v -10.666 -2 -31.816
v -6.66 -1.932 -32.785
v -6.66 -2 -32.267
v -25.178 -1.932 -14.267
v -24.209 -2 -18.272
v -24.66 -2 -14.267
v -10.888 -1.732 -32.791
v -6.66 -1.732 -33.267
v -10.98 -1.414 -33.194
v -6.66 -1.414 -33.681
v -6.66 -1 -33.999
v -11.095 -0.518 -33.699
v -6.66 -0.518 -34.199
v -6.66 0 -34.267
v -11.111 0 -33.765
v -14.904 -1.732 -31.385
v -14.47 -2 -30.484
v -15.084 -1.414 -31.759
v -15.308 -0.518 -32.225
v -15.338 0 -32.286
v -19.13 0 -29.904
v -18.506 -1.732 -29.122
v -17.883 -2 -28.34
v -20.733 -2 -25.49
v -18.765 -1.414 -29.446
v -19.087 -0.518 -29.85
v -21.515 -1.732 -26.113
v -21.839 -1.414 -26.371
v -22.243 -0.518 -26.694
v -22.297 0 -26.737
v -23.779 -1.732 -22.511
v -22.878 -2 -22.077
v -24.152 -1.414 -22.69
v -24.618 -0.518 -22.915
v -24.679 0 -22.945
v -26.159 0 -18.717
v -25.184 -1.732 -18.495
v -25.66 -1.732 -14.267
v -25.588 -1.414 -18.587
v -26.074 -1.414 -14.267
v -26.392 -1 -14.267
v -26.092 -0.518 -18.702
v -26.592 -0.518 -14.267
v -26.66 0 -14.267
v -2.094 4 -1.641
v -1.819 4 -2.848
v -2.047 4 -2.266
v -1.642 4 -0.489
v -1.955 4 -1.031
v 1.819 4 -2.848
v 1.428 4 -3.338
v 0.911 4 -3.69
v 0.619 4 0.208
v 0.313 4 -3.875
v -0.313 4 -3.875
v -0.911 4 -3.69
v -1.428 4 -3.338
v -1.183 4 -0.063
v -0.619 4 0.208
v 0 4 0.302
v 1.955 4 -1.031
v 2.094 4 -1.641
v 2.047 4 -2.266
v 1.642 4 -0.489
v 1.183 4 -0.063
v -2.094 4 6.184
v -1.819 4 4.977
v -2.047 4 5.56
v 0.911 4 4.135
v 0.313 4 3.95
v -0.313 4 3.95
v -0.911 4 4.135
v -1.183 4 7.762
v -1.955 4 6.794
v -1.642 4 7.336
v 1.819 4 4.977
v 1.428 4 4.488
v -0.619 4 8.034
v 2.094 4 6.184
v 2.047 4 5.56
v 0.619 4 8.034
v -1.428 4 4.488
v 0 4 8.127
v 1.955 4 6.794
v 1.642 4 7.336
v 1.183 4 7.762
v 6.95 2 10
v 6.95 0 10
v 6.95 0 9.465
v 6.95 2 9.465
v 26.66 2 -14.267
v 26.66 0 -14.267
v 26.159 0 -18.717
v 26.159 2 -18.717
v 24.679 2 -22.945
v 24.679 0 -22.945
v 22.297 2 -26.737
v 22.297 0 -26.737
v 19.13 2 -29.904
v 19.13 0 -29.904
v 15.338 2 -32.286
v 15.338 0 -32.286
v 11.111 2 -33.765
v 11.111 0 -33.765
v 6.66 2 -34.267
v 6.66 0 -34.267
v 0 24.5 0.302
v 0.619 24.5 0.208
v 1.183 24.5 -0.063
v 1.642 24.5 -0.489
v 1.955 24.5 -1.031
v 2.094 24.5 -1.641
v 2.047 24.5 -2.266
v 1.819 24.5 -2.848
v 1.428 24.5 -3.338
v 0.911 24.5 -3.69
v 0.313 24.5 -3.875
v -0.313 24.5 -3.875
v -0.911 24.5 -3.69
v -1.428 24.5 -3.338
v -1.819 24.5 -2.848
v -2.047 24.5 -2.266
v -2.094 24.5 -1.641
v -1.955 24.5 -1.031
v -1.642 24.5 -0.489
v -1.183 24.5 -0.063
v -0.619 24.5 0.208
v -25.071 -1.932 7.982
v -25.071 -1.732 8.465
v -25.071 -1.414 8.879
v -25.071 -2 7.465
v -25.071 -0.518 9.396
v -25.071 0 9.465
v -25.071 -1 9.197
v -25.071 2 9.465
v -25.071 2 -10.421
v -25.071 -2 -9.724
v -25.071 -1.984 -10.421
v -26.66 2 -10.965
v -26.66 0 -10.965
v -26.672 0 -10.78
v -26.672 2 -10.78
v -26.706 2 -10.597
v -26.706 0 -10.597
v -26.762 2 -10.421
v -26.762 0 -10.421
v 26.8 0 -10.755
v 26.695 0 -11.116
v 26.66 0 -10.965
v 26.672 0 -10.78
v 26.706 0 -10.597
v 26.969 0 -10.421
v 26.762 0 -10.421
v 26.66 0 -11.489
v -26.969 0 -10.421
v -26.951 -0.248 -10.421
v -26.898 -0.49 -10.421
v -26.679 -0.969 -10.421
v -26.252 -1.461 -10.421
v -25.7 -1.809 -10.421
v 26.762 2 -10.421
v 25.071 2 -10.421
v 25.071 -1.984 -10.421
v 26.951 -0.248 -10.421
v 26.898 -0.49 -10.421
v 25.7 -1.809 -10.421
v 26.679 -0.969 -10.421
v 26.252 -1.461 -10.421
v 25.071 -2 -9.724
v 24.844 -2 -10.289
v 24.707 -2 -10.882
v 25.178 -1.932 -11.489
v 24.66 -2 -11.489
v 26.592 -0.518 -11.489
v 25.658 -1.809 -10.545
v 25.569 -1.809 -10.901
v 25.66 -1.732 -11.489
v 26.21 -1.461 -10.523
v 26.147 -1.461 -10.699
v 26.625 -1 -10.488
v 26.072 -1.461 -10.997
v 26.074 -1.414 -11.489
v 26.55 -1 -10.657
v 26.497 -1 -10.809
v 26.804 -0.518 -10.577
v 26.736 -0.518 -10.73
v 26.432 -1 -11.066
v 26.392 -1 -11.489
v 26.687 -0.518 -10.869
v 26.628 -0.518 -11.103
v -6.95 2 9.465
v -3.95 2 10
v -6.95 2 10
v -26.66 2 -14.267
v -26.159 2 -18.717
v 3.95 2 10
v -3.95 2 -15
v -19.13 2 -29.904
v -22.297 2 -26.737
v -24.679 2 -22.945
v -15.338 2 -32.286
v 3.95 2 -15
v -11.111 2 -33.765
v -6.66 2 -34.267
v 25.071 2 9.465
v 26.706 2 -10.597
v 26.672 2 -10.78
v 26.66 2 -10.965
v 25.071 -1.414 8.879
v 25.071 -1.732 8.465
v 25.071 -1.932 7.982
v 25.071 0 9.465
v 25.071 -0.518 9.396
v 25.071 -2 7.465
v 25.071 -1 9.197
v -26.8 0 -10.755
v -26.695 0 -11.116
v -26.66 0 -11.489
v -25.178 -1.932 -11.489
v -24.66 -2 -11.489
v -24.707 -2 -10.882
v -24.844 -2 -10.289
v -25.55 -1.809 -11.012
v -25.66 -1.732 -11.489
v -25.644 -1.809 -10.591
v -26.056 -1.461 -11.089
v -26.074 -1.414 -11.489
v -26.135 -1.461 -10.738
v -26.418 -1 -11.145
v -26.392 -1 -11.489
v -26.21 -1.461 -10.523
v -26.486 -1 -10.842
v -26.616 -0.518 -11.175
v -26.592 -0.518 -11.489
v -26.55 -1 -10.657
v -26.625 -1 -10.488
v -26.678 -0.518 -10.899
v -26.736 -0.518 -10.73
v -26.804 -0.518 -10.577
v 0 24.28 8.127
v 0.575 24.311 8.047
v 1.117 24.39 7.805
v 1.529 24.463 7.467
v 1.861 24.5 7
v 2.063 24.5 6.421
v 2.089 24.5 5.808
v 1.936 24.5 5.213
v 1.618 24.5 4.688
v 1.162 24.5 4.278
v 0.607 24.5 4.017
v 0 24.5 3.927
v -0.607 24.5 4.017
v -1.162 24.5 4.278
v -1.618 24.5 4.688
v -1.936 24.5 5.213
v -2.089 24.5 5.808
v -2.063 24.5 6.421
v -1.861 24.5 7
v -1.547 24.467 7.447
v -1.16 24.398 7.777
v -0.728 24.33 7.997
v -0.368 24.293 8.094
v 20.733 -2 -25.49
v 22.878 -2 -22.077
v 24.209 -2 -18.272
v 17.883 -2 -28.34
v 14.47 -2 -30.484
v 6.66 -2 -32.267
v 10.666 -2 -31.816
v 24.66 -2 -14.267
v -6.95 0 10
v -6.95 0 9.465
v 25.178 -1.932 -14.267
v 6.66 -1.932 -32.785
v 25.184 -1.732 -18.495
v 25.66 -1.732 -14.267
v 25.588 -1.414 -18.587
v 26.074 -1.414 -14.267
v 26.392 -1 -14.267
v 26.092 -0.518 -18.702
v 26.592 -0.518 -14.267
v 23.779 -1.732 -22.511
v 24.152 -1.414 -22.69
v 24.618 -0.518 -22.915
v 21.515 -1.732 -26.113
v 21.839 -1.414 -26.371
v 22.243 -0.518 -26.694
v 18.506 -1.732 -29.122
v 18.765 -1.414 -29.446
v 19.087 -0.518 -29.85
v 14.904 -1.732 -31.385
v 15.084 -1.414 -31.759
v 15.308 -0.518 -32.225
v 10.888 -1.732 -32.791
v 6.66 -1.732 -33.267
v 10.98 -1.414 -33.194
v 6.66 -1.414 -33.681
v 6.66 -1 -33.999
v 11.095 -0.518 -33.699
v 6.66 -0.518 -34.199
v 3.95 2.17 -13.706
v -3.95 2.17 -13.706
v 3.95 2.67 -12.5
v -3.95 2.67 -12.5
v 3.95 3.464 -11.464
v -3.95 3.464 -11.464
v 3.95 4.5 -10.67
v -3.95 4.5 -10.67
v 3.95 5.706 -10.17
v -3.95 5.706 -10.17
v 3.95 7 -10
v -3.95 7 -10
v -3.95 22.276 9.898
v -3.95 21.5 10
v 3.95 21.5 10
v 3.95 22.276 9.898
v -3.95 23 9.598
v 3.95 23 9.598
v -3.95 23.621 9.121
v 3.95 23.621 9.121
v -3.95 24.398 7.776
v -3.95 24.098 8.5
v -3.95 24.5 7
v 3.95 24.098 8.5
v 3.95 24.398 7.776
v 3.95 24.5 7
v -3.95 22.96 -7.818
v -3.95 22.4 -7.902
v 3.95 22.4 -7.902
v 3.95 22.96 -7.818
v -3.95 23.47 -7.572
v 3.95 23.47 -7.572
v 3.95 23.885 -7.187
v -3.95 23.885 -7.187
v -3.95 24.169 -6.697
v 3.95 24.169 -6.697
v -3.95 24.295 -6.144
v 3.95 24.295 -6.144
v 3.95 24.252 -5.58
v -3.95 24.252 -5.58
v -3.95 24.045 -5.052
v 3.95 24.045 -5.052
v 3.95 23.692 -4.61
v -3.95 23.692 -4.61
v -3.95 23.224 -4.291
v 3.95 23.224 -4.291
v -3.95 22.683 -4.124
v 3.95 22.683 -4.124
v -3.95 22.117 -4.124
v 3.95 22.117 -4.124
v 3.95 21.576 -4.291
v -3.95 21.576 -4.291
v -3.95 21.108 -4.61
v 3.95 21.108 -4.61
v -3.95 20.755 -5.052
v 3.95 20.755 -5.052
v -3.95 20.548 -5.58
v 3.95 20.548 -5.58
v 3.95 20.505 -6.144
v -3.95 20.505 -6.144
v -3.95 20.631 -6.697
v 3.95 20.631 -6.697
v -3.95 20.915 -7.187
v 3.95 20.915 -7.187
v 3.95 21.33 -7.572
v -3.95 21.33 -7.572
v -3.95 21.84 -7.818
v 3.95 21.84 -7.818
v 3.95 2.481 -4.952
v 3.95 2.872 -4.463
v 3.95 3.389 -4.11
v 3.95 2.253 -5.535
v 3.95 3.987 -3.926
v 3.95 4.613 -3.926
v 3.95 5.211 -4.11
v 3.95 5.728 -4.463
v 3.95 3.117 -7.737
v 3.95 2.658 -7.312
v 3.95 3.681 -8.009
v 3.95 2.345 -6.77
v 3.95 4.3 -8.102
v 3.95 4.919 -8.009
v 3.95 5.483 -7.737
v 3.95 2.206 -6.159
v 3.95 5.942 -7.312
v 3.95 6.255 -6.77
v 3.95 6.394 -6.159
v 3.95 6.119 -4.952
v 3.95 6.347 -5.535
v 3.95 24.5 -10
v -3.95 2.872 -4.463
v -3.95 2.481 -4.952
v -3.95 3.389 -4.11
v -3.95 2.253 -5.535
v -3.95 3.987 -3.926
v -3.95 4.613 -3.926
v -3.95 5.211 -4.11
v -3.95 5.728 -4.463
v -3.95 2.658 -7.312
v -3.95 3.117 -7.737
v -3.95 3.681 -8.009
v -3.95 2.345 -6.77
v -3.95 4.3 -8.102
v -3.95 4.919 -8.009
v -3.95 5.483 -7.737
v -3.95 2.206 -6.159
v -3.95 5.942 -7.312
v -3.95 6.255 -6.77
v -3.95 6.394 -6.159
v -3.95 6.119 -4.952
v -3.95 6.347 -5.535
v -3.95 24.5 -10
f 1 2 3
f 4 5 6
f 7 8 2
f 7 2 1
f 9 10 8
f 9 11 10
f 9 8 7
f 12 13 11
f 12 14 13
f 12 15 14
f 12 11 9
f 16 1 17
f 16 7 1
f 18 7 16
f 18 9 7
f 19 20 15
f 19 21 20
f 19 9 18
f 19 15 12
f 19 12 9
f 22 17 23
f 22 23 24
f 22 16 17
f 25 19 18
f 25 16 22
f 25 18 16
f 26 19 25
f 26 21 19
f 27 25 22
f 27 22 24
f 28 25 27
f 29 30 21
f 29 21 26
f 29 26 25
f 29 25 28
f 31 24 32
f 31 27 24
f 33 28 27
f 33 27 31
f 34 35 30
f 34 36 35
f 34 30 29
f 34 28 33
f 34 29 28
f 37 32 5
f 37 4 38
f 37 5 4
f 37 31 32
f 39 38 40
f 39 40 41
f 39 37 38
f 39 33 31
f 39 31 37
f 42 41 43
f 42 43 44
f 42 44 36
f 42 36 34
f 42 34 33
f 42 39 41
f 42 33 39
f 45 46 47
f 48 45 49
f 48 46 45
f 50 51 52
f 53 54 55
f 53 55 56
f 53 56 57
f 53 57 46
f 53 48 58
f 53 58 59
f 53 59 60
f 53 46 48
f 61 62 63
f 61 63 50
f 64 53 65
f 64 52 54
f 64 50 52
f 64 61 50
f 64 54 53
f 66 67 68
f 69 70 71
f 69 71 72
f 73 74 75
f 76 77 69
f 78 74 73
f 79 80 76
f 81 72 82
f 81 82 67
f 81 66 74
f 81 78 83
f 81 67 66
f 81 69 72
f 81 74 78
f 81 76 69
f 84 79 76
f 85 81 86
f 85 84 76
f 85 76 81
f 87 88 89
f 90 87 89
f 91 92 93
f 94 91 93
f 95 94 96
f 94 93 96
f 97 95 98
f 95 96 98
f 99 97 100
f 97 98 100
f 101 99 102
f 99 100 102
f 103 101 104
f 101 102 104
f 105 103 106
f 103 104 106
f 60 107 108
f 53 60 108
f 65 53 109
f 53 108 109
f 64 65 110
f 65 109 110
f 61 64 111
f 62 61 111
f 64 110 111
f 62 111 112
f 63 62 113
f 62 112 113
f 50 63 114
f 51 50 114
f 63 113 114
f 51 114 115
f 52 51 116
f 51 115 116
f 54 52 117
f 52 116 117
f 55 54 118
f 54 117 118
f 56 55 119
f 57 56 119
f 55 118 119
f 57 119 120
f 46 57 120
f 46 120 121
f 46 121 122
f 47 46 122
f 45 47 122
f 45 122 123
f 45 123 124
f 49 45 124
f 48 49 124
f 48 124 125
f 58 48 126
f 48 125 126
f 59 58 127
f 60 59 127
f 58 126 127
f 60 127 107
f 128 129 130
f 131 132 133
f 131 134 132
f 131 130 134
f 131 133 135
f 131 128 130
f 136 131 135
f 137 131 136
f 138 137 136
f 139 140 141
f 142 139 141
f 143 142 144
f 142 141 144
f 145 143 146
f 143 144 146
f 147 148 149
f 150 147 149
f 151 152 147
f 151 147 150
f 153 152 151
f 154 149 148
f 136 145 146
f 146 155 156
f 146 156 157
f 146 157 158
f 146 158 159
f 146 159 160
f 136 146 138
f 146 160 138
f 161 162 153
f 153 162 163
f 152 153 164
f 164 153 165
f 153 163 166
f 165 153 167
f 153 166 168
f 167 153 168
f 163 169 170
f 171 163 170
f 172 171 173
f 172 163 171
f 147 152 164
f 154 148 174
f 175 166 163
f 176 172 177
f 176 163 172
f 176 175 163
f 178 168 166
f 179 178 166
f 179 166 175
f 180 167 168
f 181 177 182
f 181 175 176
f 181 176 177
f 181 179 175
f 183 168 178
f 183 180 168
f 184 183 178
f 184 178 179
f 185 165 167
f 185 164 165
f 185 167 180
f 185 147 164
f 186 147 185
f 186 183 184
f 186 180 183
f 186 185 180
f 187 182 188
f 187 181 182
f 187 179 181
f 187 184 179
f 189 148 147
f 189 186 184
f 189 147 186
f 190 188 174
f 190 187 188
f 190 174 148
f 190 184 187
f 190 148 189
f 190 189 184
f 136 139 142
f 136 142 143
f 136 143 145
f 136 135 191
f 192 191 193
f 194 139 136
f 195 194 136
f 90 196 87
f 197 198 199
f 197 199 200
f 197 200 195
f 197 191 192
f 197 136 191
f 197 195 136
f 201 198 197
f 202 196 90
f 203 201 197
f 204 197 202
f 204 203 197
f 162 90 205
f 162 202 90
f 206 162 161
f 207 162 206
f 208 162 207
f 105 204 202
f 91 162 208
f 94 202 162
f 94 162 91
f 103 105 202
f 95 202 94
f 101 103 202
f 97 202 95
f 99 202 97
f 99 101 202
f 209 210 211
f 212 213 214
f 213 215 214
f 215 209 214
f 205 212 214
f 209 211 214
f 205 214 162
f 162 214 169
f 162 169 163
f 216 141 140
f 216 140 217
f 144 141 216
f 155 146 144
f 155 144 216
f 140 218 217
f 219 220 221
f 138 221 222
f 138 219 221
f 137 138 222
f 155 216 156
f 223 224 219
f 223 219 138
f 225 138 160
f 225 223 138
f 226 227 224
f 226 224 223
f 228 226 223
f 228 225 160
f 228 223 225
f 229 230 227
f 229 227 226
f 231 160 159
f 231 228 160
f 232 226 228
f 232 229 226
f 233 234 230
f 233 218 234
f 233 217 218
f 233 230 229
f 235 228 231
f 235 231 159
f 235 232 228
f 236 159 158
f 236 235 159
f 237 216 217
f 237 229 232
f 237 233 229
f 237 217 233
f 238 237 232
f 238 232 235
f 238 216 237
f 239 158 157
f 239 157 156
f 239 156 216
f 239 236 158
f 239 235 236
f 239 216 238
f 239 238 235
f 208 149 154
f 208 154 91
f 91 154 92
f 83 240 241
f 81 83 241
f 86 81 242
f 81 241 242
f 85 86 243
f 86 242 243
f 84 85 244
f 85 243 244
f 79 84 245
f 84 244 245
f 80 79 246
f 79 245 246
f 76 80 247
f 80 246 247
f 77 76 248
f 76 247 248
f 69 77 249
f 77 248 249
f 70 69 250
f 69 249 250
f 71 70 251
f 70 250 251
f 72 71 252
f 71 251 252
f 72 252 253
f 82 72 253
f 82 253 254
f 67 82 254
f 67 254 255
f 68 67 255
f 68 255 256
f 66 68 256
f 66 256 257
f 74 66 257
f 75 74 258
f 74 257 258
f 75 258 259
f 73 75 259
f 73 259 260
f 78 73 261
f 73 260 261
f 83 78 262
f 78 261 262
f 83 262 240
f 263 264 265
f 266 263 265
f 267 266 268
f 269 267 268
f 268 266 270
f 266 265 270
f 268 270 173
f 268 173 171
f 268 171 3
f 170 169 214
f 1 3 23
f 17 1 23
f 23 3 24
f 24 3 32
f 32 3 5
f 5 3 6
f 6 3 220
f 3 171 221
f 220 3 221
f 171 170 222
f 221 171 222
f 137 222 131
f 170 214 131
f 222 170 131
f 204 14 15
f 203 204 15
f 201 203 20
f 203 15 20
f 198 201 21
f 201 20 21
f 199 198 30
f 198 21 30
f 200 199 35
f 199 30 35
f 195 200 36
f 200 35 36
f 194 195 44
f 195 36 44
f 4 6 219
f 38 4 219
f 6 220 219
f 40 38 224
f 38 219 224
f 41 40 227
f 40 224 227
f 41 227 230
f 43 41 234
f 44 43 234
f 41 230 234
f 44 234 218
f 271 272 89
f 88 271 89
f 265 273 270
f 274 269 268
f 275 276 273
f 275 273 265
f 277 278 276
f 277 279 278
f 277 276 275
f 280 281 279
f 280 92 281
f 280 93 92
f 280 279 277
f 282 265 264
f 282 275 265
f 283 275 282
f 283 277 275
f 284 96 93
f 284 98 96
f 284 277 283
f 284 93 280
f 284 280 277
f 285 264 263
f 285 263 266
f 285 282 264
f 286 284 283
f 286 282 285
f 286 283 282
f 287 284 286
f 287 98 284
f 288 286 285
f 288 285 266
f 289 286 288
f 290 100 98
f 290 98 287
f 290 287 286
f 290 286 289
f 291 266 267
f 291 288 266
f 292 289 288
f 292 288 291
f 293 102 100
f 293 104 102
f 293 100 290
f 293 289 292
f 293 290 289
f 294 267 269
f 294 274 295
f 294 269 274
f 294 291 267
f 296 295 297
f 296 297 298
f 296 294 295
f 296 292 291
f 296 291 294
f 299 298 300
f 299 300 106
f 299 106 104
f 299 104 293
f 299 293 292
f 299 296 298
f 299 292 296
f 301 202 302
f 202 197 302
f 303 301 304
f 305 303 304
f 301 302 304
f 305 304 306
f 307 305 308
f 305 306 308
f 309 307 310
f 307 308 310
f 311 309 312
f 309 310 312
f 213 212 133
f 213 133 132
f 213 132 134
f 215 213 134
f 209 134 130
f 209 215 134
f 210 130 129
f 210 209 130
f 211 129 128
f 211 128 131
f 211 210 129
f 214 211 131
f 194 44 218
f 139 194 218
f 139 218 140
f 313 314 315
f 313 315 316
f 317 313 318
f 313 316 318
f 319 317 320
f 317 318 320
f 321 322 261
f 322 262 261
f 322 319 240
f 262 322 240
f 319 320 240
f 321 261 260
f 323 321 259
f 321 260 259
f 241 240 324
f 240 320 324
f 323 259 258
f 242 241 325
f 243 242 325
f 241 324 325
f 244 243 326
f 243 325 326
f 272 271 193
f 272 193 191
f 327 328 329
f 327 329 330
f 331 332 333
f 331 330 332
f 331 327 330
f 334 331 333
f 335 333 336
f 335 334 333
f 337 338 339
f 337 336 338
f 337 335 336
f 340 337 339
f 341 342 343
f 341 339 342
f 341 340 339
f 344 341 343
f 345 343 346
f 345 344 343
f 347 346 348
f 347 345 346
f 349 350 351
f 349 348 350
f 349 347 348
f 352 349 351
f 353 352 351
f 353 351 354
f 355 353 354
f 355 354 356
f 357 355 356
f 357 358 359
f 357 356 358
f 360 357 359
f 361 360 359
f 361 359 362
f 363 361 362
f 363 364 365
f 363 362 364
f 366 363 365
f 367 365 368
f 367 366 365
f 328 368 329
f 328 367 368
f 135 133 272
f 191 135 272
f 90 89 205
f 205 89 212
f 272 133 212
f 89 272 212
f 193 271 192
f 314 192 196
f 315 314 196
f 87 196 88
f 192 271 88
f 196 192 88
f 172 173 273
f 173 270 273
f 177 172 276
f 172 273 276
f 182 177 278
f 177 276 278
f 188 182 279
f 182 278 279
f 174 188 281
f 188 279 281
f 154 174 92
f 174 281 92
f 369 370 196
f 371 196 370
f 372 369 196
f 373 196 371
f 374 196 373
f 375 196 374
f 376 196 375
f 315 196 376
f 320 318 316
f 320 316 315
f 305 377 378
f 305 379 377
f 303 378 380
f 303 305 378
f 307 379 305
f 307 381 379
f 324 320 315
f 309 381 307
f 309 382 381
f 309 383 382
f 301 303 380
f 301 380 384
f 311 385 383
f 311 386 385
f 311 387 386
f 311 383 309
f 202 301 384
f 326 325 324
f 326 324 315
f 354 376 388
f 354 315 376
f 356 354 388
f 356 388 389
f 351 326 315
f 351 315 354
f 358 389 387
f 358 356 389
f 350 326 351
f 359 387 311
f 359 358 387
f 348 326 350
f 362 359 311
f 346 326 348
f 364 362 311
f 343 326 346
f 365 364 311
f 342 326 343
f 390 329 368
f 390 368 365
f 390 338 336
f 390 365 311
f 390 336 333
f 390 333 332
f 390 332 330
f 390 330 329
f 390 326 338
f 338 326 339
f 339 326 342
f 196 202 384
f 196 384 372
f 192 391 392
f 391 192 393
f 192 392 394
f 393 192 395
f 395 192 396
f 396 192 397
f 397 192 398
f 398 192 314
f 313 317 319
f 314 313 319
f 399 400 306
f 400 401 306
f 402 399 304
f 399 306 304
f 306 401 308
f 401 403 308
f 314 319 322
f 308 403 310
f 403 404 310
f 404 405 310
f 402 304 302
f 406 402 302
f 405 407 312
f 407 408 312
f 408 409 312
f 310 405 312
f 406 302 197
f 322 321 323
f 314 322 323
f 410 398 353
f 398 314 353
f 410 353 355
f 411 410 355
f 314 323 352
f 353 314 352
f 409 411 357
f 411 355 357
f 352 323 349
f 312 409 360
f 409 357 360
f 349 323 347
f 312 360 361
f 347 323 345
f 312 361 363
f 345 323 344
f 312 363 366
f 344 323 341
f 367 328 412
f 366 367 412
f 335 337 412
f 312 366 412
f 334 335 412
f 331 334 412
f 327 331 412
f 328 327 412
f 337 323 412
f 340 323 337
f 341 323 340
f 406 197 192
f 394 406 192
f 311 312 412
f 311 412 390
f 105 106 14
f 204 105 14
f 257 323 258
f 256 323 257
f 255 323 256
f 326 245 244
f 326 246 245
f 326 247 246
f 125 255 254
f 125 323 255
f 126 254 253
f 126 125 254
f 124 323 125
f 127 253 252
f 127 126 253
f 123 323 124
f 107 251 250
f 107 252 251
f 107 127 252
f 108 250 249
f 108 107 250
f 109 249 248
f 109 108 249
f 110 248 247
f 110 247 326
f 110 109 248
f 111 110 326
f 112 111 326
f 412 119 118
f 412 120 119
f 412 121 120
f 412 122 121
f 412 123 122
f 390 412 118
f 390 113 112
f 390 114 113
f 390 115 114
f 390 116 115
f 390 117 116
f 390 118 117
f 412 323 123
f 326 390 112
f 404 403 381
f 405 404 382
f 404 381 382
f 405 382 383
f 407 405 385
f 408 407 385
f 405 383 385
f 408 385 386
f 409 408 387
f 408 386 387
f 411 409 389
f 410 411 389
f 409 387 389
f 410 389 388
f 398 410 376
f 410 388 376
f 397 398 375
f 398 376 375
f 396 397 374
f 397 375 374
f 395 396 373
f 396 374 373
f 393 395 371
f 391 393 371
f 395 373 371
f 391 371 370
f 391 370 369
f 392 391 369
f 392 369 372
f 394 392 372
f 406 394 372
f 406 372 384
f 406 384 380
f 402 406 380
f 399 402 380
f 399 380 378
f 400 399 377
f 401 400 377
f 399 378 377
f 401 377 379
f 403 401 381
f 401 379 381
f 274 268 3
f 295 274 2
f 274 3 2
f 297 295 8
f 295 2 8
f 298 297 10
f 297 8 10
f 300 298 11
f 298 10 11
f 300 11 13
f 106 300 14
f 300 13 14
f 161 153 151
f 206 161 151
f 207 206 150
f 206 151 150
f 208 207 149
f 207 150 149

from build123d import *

# Parameters (mm, degrees)
SALIENTE_EXTRUIR1_DEPTH     = 2
CROQUIS2_W                  = 13.9
CROQUIS2_H                  = 20
SALIENTE_EXTRUIR2_DEPTH     = 24.5
SALIENTE_EXTRUIR3_DEPTH     = 22.5
CROQUIS5_R                  = 2.1
CORTAR_EXTRUIR2_DEPTH       = 20.5
CROQUIS16_W                 = 3
CROQUIS16_H                 = 33.930468167
CORTAR_EXTRUIR8_DEPTH       = 22.5
CORTAR_EXTRUIR1_DEPTH       = 27
CORTAR_EXTRUIR1_DEPTH_BACK  = 65.5
CROQUIS4_R                  = 1.599999999
REDONDEO1_R                 = 3
REDONDEO2_R                 = 5
SALIENTE_EXTRUIR5_START     = 2
SALIENTE_EXTRUIR5_DEPTH     = 2
REDONDEO6_R                 = 2
REDONDEO7_R                 = 2
CROQUIS17_R                 = 2.1
CORTAR_EXTRUIR9_DEPTH       = 10
CORTAR_EXTRUIR14_DEPTH      = 11
CORTAR_EXTRUIR14_DEPTH_BACK = 10
CROQUIS18_R                 = 1.9
CROQUIS19_R                 = 18.5
CORTAR_EXTRUIR15_DEPTH      = 3.5
CORTAR_EXTRUIR16_START      = -56
CROQUIS20_R                 = 18.5
CORTAR_EXTRUIR16_DEPTH      = 3.5
CORTAR_EXTRUIR17_DEPTH      = 47
CORTAR_EXTRUIR17_DEPTH_BACK = 86
CROQUIS21_W                 = 7.397871061
CROQUIS21_H                 = 19.885366365


# Some blends are built 0.0001 mm under size
with BuildPart() as part:
    # Croquis1 → Saliente-Extruir1 (new body)
    with BuildSketch(Plane(origin=(0, 0, 0), x_dir=(1, 0, 0), z_dir=(0, 1, 0))):
        with BuildLine():
            Line((-31.5, -9.464532567), (31.5, -9.464532567))
            Line((31.5, -9.464532567), (31.5, 7.964532567))
            ThreePointArc((31.5, 7.964532567), (31.060660172, 9.025192739), (30, 9.464532567))
            Line((30, 9.464532567), (28.160101256, 9.464532567))
            ThreePointArc((28.160101256, 9.464532567), (27.099441084, 9.903872396), (26.660101256, 10.964532567))
            Line((26.660101256, 10.964532567), (26.660101256, 14.266885585))
            ThreePointArc((26.660101256, 14.266885585), (20.802236879, 28.409021208), (6.660101256, 34.266885585))
            Line((6.660101256, 34.266885585), (-6.660101256, 34.266885585))
            ThreePointArc((-6.660101256, 34.266885585), (-20.802236879, 28.409021208), (-26.660101256, 14.266885585))
            Line((-26.660101256, 14.266885585), (-26.660101256, 10.964532567))
            ThreePointArc((-26.660101256, 10.964532567), (-27.099441084, 9.903872396), (-28.160101256, 9.464532567))
            Line((-28.160101256, 9.464532567), (-30, 9.464532567))
            ThreePointArc((-30, 9.464532567), (-31.060660172, 9.025192739), (-31.5, 7.964532567))
            Line((-31.5, 7.964532567), (-31.5, -9.464532567))
        make_face()
    extrude(amount=SALIENTE_EXTRUIR1_DEPTH)

    # Croquis2 → Saliente-Extruir2 (add)
    with BuildSketch(Plane(origin=(0, 0, 0), x_dir=(1, 0, 0), z_dir=(0, 1, 0))):
        Rectangle(CROQUIS2_W, CROQUIS2_H)
    extrude(amount=SALIENTE_EXTRUIR2_DEPTH)

    # Croquis3 → Saliente-Extruir3 (add)
    with BuildSketch(Plane(origin=(0, 2, 0), x_dir=(1, 0, 0), z_dir=(0, 1, 0))):
        with BuildLine():
            ThreePointArc((28.160101256, 9.464532567), (27.375457574, 9.686121721), (26.822638598, 10.285420177))
            Line((26.822638598, 10.285420177), (25.6, 10.285420177))
            Line((25.6, 10.285420177), (25.6, -2.749999823))
            Line((25.6, -2.749999823), (31.5, -2.749999823))
            Line((31.5, -2.749999823), (31.5, 7.964532567))
            ThreePointArc((31.5, 7.964532567), (31.060660172, 9.025192739), (30, 9.464532567))
            Line((30, 9.464532567), (28.160101256, 9.464532567))
        make_face()
        with BuildLine():
            Line((-25.6, 10.285420177), (-26.822638598, 10.285420177))
            ThreePointArc((-26.822638598, 10.285420177), (-27.375457574, 9.686121721), (-28.160101256, 9.464532567))
            Line((-28.160101256, 9.464532567), (-30, 9.464532567))
            ThreePointArc((-30, 9.464532567), (-31.060660172, 9.025192739), (-31.5, 7.964532567))
            Line((-31.5, 7.964532567), (-31.5, -2.749999823))
            Line((-31.5, -2.749999823), (-25.6, -2.749999823))
            Line((-25.6, -2.749999823), (-25.6, 10.285420177))
        make_face()
    extrude(amount=SALIENTE_EXTRUIR3_DEPTH)

    # Croquis5 → Cortar-Extruir2 (cut)
    with BuildSketch(Plane(origin=(0, 24.5, 0), x_dir=(1, 0, 0), z_dir=(0, 1, 0))):
        with Locations(Location((0, 1.798301608, 0), (0, 0, 270))):
            Circle(CROQUIS5_R)
        with Locations(Location((0, -6.026932469, 0), (0, 0, 270))):
            Circle(CROQUIS5_R)
        with Locations(Location((-28.55, 1.798301608, 0), (0, 0, 270))):
            Circle(CROQUIS5_R)
        with Locations(Location((28.55, 1.798301608, 0), (0, 0, 270))):
            Circle(CROQUIS5_R)
    extrude(amount=-CORTAR_EXTRUIR2_DEPTH, mode=Mode.SUBTRACT)

    # Croquis16 → Cortar-Extruir8 (cut)
    with BuildSketch(Plane(origin=(0, 24.5, 0), x_dir=(1, 0, 0), z_dir=(0, 1, 0))):
        with Locations((5.45, 0.270579682)):
            Rectangle(CROQUIS16_W, CROQUIS16_H)
        with Locations((-5.45, 0.270579682)):
            Rectangle(CROQUIS16_W, CROQUIS16_H)
    extrude(amount=-CORTAR_EXTRUIR8_DEPTH, mode=Mode.SUBTRACT)

    # Croquis4 → Cortar-Extruir1 (cut, two sides: drawn at the far end of the back side and taken through both)
    with BuildSketch(Plane.ZY.offset(25.5).offset(-CORTAR_EXTRUIR1_DEPTH_BACK)):
        with Locations(Location((-6.002353017, 4.3, 0), (0, 0, 180))):
            Circle(CROQUIS4_R)
        with Locations(Location((-6.002353017, 22.4, 0), (0, 0, 180))):
            Circle(CROQUIS4_R)
    extrude(amount=CORTAR_EXTRUIR1_DEPTH + CORTAR_EXTRUIR1_DEPTH_BACK, mode=Mode.SUBTRACT)

    # Redondeo1
    # the kernel refuses this fillet: 3 mm, written as the material it adds along each edge
    with BuildSketch(Plane(origin=(25.6, 2, 2.749999823), x_dir=(0, 0, 1), z_dir=(1, 0, 0))) as redondeo1_piece_1:
        with BuildLine():
            CenterArc((REDONDEO1_R, -REDONDEO1_R), REDONDEO1_R, 90, 90)
            Line((0, -REDONDEO1_R), (0, 0))
            Line((0, 0), (REDONDEO1_R, 0))
        make_face()
    extrude(amount=5.9)
    # the kernel refuses this fillet: 3 mm, written as the material it takes off along each edge
    with BuildSketch(Plane(origin=(11.45, 24.5, 10), x_dir=(0, 0, -1), z_dir=(-1, 0, 0))) as redondeo1_2_piece_1:
        with BuildLine():
            CenterArc((REDONDEO1_R, REDONDEO1_R), REDONDEO1_R, 180, 90)
            Line((0, REDONDEO1_R), (0, 0))
            Line((0, 0), (REDONDEO1_R, 0))
        make_face()
    extrude(amount=22.9, mode=Mode.SUBTRACT)

    # Redondeo2
    redondeo2_edges = [part.edges().sort_by_distance(p)[0] for p in [
        (0, 2, -10),
    ]]
    fillet(redondeo2_edges, radius=REDONDEO2_R)

    # Croquis15 → Saliente-Extruir5 (add)
    with BuildSketch(Plane.XZ.offset(SALIENTE_EXTRUIR5_START)):
        with BuildLine():
            Line((-31.5, 9.464532567), (31.5, 9.464532567))
            Line((31.5, 9.464532567), (31.5, -7.489095092))
            ThreePointArc((31.5, -7.489095092), (30.914213562, -8.903308654), (29.5, -9.489095092))
            Line((29.5, -9.489095092), (28.660101256, -9.489095092))
            ThreePointArc((28.660101256, -9.489095092), (27.245887693, -10.074881529), (26.660101256, -11.489095092))
            Line((26.660101256, -11.489095092), (26.660101256, -14.266885585))
            ThreePointArc((26.660101256, -14.266885585), (20.802236879, -28.409021208), (6.660101256, -34.266885585))
            Line((6.660101256, -34.266885585), (1.137553535, -34.266885585))
            Line((1.137553535, -34.266885585), (-1.137553535, -34.266885585))
            Line((-1.137553535, -34.266885585), (-6.660101256, -34.266885585))
            ThreePointArc((-6.660101256, -34.266885585), (-20.802236879, -28.409021208), (-26.660101256, -14.266885585))
            Line((-26.660101256, -14.266885585), (-26.660101256, -11.489095092))
            ThreePointArc((-26.660101256, -11.489095092), (-27.245887693, -10.074881529), (-28.660101256, -9.489095092))
            Line((-28.660101256, -9.489095092), (-29.5, -9.489095092))
            ThreePointArc((-29.5, -9.489095092), (-30.914213562, -8.903308654), (-31.5, -7.489095092))
            Line((-31.5, -7.489095092), (-31.5, 9.464532567))
        make_face()
    extrude(amount=-SALIENTE_EXTRUIR5_DEPTH)

    # Redondeo6
    redondeo6_edges = [part.edges().sort_by_distance(p)[0] for p in [
        (-31.5, -2, 0.987718738),
        (-30.914213562, -2, -8.903308654),
        (-29.080050628, -2, -9.489095092),
        (-27.245887693, -2, -10.074881529),
        (-26.660101256, -2, -12.877990338),
        (-20.802236879, -2, -28.409021208),
        (0, -2, -34.266885585),
        (20.802236879, -2, -28.409021208),
        (26.660101256, -2, -12.877990338),
        (27.245887693, -2, -10.074881529),
        (29.080050628, -2, -9.489095092),
        (30.914213562, -2, -8.903308654),
        (31.5, -2, 0.987718738),
    ]]
    fillet(redondeo6_edges, radius=REDONDEO6_R - 0.0001)  # a hair under: the kernel refuses the full size

    # Redondeo7
    redondeo7_edges = [part.edges().sort_by_distance(p)[0] for p in [
        (31.5, 0.99995, 9.464532567),
        (-31.5, 0.99995, 9.464532567),
        (0, -2, 9.464532567),
        (30.914242852, -1.414242852, 9.464532567),
        (-30.914242852, -1.414242852, 9.464532567),
    ]]
    fillet(redondeo7_edges, radius=REDONDEO7_R - 0.0001)  # a hair under: the kernel refuses the full size

    # Croquis17 → Cortar-Extruir9 (cut, symmetric)
    with BuildSketch(Plane(origin=(0, 0, 0), x_dir=(0, 0, -1), z_dir=(1, 0, 0))):
        with Locations((6.002353017, 4.3)):
            Circle(CROQUIS17_R)
    extrude(amount=CORTAR_EXTRUIR9_DEPTH, both=True, mode=Mode.SUBTRACT)

    # Croquis18 → Cortar-Extruir14 (cut, two sides: drawn at the far end of the back side and taken through both)
    with BuildSketch(Plane(origin=(0, 0, 0), x_dir=(0, 0, -1), z_dir=(1, 0, 0)).offset(-CORTAR_EXTRUIR14_DEPTH_BACK)):
        with Locations((6.002353017, 22.4)):
            Circle(CROQUIS18_R)
    extrude(amount=CORTAR_EXTRUIR14_DEPTH + CORTAR_EXTRUIR14_DEPTH_BACK, mode=Mode.SUBTRACT)

    # Croquis19 → Cortar-Extruir15 (cut)
    with BuildSketch(Plane(origin=(31.5, 0, 0), x_dir=(0, 0, -1), z_dir=(1, 0, 0))):
        with Locations((25.179802512, 14.045485316)):
            Circle(CROQUIS19_R)
    extrude(amount=-CORTAR_EXTRUIR15_DEPTH, mode=Mode.SUBTRACT)

    # Croquis20 → Cortar-Extruir16 (cut)
    with BuildSketch(Plane(origin=(28, 0, 0), x_dir=(0, 0, -1), z_dir=(1, 0, 0)).offset(CORTAR_EXTRUIR16_START)):
        with Locations((25.179802512, 14.045485316)):
            Circle(CROQUIS20_R)
    extrude(amount=-CORTAR_EXTRUIR16_DEPTH, mode=Mode.SUBTRACT)

    # Croquis21 → Cortar-Extruir17 (cut, two sides: drawn at the far end of the back side and taken through both)
    with BuildSketch(Plane(origin=(0, 2, 0), x_dir=(1, 0, 0), z_dir=(0, 1, 0)).offset(-CORTAR_EXTRUIR17_DEPTH_BACK)):
        with Locations((-28.769498571, 0.478150615)):
            Rectangle(CROQUIS21_W, CROQUIS21_H)
        with Locations((28.769498571, 0.478150615)):
            Rectangle(CROQUIS21_W, CROQUIS21_H)
    extrude(amount=CORTAR_EXTRUIR17_DEPTH + CORTAR_EXTRUIR17_DEPTH_BACK, mode=Mode.SUBTRACT)


solid = part.part
